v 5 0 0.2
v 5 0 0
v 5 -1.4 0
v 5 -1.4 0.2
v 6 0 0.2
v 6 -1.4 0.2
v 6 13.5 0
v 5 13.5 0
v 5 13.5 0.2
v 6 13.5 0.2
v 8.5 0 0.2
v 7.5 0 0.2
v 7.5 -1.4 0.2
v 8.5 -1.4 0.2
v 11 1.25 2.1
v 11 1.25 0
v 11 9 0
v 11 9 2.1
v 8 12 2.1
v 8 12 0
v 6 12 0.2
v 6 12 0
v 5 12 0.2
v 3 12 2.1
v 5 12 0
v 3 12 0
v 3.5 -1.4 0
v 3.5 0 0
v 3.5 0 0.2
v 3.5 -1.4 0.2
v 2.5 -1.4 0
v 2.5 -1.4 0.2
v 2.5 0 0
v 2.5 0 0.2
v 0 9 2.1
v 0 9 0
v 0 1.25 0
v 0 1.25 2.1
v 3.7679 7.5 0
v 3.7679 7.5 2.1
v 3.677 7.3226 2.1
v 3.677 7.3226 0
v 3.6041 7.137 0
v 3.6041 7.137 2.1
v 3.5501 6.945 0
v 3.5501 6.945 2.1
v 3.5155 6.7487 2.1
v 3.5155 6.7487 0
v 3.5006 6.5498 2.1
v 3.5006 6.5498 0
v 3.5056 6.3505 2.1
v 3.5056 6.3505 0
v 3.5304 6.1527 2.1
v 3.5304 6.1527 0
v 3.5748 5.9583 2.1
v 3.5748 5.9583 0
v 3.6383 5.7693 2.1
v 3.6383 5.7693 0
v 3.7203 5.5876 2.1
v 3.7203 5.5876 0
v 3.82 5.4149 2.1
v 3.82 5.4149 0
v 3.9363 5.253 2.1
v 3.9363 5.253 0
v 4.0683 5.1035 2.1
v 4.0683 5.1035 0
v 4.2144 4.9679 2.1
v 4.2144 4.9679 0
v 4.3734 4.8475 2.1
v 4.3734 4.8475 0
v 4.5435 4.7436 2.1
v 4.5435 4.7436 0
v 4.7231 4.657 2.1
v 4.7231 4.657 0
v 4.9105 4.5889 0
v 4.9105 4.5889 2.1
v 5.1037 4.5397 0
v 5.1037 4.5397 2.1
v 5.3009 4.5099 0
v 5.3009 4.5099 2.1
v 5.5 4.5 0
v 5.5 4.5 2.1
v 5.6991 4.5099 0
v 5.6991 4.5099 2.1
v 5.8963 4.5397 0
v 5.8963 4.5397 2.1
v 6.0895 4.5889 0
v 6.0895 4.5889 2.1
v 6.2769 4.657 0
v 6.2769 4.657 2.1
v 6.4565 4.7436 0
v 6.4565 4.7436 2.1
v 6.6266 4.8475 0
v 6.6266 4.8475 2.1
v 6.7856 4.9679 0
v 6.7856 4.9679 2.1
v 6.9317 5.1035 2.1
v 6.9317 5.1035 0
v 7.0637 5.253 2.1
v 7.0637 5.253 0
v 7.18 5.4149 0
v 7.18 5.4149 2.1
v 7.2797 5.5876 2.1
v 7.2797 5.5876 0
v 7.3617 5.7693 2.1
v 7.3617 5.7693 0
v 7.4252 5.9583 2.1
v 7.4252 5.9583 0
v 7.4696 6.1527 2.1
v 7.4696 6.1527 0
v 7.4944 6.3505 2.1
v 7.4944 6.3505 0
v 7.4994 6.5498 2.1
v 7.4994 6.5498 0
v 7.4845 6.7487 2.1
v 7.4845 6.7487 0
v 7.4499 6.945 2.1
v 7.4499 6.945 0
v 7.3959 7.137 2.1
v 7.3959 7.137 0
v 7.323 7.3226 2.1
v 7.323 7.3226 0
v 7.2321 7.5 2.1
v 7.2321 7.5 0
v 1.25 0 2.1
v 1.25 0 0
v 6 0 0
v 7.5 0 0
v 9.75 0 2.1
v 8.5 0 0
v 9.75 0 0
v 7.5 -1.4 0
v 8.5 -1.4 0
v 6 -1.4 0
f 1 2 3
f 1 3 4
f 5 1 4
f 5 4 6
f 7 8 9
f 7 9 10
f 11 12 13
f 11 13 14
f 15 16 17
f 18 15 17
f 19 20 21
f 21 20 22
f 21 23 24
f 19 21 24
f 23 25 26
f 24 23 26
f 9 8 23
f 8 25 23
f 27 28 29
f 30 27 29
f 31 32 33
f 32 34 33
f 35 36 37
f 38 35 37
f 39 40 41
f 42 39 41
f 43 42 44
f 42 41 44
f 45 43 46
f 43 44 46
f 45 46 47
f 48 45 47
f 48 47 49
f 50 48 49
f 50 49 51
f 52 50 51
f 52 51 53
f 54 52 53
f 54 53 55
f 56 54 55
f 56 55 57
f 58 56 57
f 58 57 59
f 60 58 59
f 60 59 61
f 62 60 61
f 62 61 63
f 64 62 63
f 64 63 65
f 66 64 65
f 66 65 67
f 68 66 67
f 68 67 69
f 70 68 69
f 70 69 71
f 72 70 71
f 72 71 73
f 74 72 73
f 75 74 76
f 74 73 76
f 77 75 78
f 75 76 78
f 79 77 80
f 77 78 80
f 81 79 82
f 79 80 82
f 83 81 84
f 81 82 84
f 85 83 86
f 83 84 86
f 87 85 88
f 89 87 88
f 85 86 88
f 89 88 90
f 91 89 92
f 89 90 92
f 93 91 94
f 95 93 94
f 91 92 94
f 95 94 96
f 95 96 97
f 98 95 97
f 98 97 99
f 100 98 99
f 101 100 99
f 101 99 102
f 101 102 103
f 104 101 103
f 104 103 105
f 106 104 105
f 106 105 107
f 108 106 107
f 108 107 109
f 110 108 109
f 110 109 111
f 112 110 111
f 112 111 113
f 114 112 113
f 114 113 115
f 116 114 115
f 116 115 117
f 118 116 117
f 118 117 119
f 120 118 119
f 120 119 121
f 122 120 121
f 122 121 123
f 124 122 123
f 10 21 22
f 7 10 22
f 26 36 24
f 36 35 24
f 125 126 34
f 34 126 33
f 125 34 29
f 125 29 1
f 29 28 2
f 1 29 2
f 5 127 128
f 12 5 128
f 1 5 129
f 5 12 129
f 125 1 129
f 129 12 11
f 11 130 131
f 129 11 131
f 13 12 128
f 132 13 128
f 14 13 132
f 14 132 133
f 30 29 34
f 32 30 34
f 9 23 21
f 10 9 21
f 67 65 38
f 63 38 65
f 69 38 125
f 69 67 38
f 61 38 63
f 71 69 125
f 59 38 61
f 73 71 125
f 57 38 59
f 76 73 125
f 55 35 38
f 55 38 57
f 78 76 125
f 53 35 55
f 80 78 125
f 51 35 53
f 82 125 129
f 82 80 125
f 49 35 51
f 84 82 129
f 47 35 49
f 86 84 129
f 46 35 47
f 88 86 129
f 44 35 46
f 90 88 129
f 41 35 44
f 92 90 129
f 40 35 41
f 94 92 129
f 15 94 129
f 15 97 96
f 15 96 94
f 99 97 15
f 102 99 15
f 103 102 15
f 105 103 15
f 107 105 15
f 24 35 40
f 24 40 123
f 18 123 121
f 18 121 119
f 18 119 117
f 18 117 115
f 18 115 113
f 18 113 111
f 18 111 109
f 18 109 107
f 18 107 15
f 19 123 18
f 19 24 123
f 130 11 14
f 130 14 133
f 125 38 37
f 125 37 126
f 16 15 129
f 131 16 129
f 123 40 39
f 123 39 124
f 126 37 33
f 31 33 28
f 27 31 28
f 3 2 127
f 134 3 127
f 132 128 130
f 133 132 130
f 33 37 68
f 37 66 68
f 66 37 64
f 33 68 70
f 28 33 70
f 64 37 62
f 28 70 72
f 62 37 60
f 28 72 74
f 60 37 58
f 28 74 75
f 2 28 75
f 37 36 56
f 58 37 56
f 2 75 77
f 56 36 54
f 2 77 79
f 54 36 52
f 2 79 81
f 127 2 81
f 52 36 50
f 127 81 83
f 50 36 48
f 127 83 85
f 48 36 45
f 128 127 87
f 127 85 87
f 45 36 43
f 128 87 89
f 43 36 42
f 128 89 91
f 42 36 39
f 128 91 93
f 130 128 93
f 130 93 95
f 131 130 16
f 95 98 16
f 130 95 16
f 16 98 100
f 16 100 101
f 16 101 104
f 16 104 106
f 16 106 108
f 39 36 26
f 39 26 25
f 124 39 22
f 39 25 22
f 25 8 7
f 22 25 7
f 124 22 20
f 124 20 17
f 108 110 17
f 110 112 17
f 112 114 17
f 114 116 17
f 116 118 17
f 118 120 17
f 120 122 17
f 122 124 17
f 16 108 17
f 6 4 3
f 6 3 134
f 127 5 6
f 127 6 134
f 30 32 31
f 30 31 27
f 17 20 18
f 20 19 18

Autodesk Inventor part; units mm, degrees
ref_plane "YZ Plane" through (0, 0, 0) normal (1, 0, 0) x (0, 1, 0)
ref_plane "XZ Plane" through (0, 0, 0) normal (0, 1, 0) x (-1, 0, 0)
ref_plane "XY Plane" through (0, 0, 0) normal (0, 0, 1) x (1, 0, 0)
sketch "スケッチ1" plane through (0, 0, 0) normal (0, 0, 1) x (1, 0, 0)
  line L0 (0, 0) -> (11, 0)
  line L1 (11, 0) -> (11, 12)
  line L2 (11, 12) -> (0, 12)
  line L3 (0, 12) -> (0, 0)
  dimension "d0" = 11
  dimension "d1" = 12
extrude "押し出し1" add sketch "スケッチ1" along normal blind 2.1
sketch "スケッチ2" plane through (0, 0, 2.1) normal (0, 0, 1) x (1, 0, 0)
  circle A0 centre (5.5, 6.5) radius 2
  line L0 (0, 12) -> (0, 0) projected
  line L1 (11, 12) -> (0, 12) projected
  line L2 (3.7679, 7.5) -> (7.2321, 7.5)
  dimension "d4" = 4
  dimension "d5" = 5.5
  dimension "d6" = 5.5
  dimension "d7" = 3
extrude "押し出し2" cut sketch "スケッチ2" against normal through all contours A0 L2 picked at (5.5553, 6.2487)
sketch "スケッチ3" plane through (0, 0, 2.1) normal (0, 0, 1) x (1, 0, 0)
  line L0 (0, 12) -> (0, 0) projected
  line L1 (0, 9) -> (3, 12)
  line L2 (11, 12) -> (0, 12) projected
  line L3 (0, 1) -> (1, 0)
  line L4 (0, 0) -> (11, 0) projected
  line L5 (5.5, 12) -> (5.5, 0)
  line L6 (11, 9) -> (8, 12)
  line L7 (11, 1) -> (10, 0)
  dimension "d10" = 45
  dimension "d12" = 1
  dimension "d13" = 3
  dimension "d14" = 1
extrude "押し出し3" cut sketch "スケッチ3" against normal through all contours L2 L1 L0
sketch "スケッチ4" plane through (0, 0, 2.1) normal (0, 0, 1) x (1, 0, 0)
  line L0 (11, 12) -> (3, 12) projected
  line L1 (8, 12) -> (11, 9)
  line L2 (11, 0) -> (11, 12) projected
  point P0 (0, 0)
  dimension "d17" = 3
  dimension "d18" = 3
extrude "押し出し4" cut sketch "スケッチ4" against normal through all
sketch "スケッチ5" plane through (0, 0, 2.1) normal (0, 0, 1) x (1, 0, 0)
  line L0 (0, 9) -> (0, 0) projected
  line L1 (0, 1.25) -> (1.25, 0)
  line L2 (0, 0) -> (11, 0) projected
  dimension "d21" = 1.25
  dimension "d29" = 1.25
extrude "押し出し5" cut sketch "スケッチ5" against normal through all
sketch "スケッチ6" plane through (0, 0, 2.1) normal (0, 0, 1) x (1, 0, 0)
  line L0 (11, 0) -> (11, 9) projected
  line L1 (11, 1.25) -> (9.75, 0)
  line L2 (1.25, 0) -> (11, 0) projected
  point P0 (0, 0)
  dimension "d25" = 1.25
  dimension "d26" = 1.25
extrude "押し出し6" cut sketch "スケッチ6" against normal through all
sketch "スケッチ7" plane through (1.25, 0, 0) normal (0, -1, 0) x (1, 0, 0)
  point P0 (-1.25, 0)
sketch "スケッチ8" plane through (0, 0, 2.1) normal (0, 0, 1) x (1, 0, 0)
  point P0 (0, 0)
sketch "スケッチ9" plane through (0, 0, 2.1) normal (0, 0, 1) x (1, 0, 0)
  point P0 (0, 0)
sketch "スケッチ10" plane through (1.25, 0, 0) normal (0, -1, 0) x (1, 0, 0)
  line L0 (3.75, 0.2) -> (4.75, 0.2)
  line L1 (4.75, 0.2) -> (4.75, 0)
  line L2 (4.75, 0) -> (3.75, 0)
  line L3 (3.75, 0) -> (3.75, 0.2)
  line L4 (0, 0) -> (8.5, 0) projected
  line L5 (6.25, 0.2) -> (7.25, 0.2)
  line L6 (7.25, 0.2) -> (7.25, 0)
  line L7 (7.25, 0) -> (6.25, 0)
  line L8 (6.25, 0) -> (6.25, 0.2)
  line L9 (9.75, 2.1) -> (9.75, 0) projected
  point P0 (-1.25, 0)
  dimension "d31" = 1
  dimension "d36" = 0.2
  dimension "d37" = 1
  dimension "d38" = 2.5
sketch "スケッチ12" plane through (1.25, 0, 0) normal (0, -1, 0) x (1, 0, 0)
  line L0 (6.25, 2.1) -> (6.25, 0) projected
  line L1 (6.75, 0) -> (9.75, 0) projected
  line L2 (6.25, 0.2) -> (7.25, 0.2)
  line L3 (7.25, 0.2) -> (7.25, 0)
  line L4 (7.25, 0) -> (6.25, 0)
  line L5 (6.25, 0) -> (6.25, 0.2)
  point P0 (-1.25, 0)
  dimension "d34" = 1
  dimension "d35" = 0.2
extrude "押し出し7" add sketch "スケッチ10" along normal blind 1.4 contours L0 L1 L2 L3
extrude "押し出し8" add sketch "スケッチ12" along normal blind 1.4
sketch "スケッチ13" plane through (1.25, 0, 0) normal (0, -1, 0) x (1, 0, 0)
  line L0 (6.25, 0) -> (2.25, 0) projected
  line L1 (2.25, 0.2) -> (1.25, 0.2)
  line L2 (1.25, 0.2) -> (1.25, 0)
  line L3 (1.25, 0) -> (2.25, 0)
  line L4 (2.25, 0) -> (2.25, 0.2)
  line L5 (-1.25, 0) -> (-1.25, 2.1) projected
  point P0 (2.5179, 0)
  point P1 (5.9821, 0)
  dimension "d43" = 0.2
  dimension "d44" = 1
  dimension "d45" = 2.5
extrude "押し出し9" add sketch "スケッチ13" along normal blind 1.4
sketch "スケッチ14" plane through (3, 12, 2.1) normal (0, 1, 0) x (1, 0, 0)
  line L0 (2, 1.9) -> (3, 1.9) projected
  line L1 (0.5, 2.1) -> (4.5, 2.1) projected
  line L2 (2, 1.9) -> (3, 1.9)
  line L3 (3, 1.9) -> (3, 2.1)
  line L4 (3, 2.1) -> (2, 2.1)
  line L5 (2, 2.1) -> (2, 1.9)
  point P0 (-3, 2.1)
  point P1 (0.7679, 2.1)
  point P2 (4.2321, 2.1)
  dimension "d48" = 1
extrude "押し出し10" add sketch "スケッチ14" along normal blind 1.5
properties part number "3SR08_ポテンショメータ"
